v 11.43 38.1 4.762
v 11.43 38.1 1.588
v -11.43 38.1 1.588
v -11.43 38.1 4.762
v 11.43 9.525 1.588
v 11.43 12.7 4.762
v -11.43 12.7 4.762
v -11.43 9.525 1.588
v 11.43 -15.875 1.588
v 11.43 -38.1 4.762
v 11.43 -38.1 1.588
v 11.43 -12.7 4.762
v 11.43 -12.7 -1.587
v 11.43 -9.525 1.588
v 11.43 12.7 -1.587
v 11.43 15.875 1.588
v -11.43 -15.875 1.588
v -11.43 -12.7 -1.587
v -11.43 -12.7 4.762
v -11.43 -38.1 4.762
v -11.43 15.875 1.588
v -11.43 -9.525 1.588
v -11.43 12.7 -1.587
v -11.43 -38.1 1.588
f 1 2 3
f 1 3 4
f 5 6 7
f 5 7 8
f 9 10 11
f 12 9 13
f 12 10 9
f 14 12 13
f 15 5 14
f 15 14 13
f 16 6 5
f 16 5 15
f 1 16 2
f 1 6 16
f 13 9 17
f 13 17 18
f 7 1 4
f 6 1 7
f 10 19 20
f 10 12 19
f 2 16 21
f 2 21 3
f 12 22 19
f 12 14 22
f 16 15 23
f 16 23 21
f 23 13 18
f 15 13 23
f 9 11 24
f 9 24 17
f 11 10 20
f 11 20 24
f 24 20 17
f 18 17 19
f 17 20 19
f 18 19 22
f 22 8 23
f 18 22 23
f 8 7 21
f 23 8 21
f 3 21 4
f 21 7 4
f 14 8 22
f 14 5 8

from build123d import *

# Parameters (mm, degrees)
F1_DEPTH = 11.43


with BuildPart() as f1:
    # F0 (on Right) → F1 (new body, symmetric)
    with BuildSketch(Plane.YZ):
        Polygon((-15.875, 1.5875), (-12.7, 1.5875), (-12.7, 4.7625), (-38.1, 4.7625), (-38.1, 1.5875), align=None)
        Polygon((9.525, 1.5875), (12.7, 1.5875), (12.7, 4.7625), align=None)
        Polygon((-12.7, 1.5875), (-9.525, 1.5875), (-12.7, 4.7625), align=None)
        Polygon((15.875, 1.5875), (12.7, 1.5875), (12.7, -1.5875), align=None)
        Polygon((-15.875, 1.5875), (-12.7, -1.5875), (-12.7, 1.5875), align=None)
        Polygon((12.7, 4.7625), (12.7, 1.5875), (15.875, 1.5875), (38.1, 1.5875), (38.1, 4.7625), align=None)
        Polygon((12.7, -1.5875), (12.7, 1.5875), (9.525, 1.5875), (-9.525, 1.5875), (-12.7, 1.5875), (-12.7, -1.5875), align=None)
    extrude(amount=F1_DEPTH, both=True)


solid = f1.part
